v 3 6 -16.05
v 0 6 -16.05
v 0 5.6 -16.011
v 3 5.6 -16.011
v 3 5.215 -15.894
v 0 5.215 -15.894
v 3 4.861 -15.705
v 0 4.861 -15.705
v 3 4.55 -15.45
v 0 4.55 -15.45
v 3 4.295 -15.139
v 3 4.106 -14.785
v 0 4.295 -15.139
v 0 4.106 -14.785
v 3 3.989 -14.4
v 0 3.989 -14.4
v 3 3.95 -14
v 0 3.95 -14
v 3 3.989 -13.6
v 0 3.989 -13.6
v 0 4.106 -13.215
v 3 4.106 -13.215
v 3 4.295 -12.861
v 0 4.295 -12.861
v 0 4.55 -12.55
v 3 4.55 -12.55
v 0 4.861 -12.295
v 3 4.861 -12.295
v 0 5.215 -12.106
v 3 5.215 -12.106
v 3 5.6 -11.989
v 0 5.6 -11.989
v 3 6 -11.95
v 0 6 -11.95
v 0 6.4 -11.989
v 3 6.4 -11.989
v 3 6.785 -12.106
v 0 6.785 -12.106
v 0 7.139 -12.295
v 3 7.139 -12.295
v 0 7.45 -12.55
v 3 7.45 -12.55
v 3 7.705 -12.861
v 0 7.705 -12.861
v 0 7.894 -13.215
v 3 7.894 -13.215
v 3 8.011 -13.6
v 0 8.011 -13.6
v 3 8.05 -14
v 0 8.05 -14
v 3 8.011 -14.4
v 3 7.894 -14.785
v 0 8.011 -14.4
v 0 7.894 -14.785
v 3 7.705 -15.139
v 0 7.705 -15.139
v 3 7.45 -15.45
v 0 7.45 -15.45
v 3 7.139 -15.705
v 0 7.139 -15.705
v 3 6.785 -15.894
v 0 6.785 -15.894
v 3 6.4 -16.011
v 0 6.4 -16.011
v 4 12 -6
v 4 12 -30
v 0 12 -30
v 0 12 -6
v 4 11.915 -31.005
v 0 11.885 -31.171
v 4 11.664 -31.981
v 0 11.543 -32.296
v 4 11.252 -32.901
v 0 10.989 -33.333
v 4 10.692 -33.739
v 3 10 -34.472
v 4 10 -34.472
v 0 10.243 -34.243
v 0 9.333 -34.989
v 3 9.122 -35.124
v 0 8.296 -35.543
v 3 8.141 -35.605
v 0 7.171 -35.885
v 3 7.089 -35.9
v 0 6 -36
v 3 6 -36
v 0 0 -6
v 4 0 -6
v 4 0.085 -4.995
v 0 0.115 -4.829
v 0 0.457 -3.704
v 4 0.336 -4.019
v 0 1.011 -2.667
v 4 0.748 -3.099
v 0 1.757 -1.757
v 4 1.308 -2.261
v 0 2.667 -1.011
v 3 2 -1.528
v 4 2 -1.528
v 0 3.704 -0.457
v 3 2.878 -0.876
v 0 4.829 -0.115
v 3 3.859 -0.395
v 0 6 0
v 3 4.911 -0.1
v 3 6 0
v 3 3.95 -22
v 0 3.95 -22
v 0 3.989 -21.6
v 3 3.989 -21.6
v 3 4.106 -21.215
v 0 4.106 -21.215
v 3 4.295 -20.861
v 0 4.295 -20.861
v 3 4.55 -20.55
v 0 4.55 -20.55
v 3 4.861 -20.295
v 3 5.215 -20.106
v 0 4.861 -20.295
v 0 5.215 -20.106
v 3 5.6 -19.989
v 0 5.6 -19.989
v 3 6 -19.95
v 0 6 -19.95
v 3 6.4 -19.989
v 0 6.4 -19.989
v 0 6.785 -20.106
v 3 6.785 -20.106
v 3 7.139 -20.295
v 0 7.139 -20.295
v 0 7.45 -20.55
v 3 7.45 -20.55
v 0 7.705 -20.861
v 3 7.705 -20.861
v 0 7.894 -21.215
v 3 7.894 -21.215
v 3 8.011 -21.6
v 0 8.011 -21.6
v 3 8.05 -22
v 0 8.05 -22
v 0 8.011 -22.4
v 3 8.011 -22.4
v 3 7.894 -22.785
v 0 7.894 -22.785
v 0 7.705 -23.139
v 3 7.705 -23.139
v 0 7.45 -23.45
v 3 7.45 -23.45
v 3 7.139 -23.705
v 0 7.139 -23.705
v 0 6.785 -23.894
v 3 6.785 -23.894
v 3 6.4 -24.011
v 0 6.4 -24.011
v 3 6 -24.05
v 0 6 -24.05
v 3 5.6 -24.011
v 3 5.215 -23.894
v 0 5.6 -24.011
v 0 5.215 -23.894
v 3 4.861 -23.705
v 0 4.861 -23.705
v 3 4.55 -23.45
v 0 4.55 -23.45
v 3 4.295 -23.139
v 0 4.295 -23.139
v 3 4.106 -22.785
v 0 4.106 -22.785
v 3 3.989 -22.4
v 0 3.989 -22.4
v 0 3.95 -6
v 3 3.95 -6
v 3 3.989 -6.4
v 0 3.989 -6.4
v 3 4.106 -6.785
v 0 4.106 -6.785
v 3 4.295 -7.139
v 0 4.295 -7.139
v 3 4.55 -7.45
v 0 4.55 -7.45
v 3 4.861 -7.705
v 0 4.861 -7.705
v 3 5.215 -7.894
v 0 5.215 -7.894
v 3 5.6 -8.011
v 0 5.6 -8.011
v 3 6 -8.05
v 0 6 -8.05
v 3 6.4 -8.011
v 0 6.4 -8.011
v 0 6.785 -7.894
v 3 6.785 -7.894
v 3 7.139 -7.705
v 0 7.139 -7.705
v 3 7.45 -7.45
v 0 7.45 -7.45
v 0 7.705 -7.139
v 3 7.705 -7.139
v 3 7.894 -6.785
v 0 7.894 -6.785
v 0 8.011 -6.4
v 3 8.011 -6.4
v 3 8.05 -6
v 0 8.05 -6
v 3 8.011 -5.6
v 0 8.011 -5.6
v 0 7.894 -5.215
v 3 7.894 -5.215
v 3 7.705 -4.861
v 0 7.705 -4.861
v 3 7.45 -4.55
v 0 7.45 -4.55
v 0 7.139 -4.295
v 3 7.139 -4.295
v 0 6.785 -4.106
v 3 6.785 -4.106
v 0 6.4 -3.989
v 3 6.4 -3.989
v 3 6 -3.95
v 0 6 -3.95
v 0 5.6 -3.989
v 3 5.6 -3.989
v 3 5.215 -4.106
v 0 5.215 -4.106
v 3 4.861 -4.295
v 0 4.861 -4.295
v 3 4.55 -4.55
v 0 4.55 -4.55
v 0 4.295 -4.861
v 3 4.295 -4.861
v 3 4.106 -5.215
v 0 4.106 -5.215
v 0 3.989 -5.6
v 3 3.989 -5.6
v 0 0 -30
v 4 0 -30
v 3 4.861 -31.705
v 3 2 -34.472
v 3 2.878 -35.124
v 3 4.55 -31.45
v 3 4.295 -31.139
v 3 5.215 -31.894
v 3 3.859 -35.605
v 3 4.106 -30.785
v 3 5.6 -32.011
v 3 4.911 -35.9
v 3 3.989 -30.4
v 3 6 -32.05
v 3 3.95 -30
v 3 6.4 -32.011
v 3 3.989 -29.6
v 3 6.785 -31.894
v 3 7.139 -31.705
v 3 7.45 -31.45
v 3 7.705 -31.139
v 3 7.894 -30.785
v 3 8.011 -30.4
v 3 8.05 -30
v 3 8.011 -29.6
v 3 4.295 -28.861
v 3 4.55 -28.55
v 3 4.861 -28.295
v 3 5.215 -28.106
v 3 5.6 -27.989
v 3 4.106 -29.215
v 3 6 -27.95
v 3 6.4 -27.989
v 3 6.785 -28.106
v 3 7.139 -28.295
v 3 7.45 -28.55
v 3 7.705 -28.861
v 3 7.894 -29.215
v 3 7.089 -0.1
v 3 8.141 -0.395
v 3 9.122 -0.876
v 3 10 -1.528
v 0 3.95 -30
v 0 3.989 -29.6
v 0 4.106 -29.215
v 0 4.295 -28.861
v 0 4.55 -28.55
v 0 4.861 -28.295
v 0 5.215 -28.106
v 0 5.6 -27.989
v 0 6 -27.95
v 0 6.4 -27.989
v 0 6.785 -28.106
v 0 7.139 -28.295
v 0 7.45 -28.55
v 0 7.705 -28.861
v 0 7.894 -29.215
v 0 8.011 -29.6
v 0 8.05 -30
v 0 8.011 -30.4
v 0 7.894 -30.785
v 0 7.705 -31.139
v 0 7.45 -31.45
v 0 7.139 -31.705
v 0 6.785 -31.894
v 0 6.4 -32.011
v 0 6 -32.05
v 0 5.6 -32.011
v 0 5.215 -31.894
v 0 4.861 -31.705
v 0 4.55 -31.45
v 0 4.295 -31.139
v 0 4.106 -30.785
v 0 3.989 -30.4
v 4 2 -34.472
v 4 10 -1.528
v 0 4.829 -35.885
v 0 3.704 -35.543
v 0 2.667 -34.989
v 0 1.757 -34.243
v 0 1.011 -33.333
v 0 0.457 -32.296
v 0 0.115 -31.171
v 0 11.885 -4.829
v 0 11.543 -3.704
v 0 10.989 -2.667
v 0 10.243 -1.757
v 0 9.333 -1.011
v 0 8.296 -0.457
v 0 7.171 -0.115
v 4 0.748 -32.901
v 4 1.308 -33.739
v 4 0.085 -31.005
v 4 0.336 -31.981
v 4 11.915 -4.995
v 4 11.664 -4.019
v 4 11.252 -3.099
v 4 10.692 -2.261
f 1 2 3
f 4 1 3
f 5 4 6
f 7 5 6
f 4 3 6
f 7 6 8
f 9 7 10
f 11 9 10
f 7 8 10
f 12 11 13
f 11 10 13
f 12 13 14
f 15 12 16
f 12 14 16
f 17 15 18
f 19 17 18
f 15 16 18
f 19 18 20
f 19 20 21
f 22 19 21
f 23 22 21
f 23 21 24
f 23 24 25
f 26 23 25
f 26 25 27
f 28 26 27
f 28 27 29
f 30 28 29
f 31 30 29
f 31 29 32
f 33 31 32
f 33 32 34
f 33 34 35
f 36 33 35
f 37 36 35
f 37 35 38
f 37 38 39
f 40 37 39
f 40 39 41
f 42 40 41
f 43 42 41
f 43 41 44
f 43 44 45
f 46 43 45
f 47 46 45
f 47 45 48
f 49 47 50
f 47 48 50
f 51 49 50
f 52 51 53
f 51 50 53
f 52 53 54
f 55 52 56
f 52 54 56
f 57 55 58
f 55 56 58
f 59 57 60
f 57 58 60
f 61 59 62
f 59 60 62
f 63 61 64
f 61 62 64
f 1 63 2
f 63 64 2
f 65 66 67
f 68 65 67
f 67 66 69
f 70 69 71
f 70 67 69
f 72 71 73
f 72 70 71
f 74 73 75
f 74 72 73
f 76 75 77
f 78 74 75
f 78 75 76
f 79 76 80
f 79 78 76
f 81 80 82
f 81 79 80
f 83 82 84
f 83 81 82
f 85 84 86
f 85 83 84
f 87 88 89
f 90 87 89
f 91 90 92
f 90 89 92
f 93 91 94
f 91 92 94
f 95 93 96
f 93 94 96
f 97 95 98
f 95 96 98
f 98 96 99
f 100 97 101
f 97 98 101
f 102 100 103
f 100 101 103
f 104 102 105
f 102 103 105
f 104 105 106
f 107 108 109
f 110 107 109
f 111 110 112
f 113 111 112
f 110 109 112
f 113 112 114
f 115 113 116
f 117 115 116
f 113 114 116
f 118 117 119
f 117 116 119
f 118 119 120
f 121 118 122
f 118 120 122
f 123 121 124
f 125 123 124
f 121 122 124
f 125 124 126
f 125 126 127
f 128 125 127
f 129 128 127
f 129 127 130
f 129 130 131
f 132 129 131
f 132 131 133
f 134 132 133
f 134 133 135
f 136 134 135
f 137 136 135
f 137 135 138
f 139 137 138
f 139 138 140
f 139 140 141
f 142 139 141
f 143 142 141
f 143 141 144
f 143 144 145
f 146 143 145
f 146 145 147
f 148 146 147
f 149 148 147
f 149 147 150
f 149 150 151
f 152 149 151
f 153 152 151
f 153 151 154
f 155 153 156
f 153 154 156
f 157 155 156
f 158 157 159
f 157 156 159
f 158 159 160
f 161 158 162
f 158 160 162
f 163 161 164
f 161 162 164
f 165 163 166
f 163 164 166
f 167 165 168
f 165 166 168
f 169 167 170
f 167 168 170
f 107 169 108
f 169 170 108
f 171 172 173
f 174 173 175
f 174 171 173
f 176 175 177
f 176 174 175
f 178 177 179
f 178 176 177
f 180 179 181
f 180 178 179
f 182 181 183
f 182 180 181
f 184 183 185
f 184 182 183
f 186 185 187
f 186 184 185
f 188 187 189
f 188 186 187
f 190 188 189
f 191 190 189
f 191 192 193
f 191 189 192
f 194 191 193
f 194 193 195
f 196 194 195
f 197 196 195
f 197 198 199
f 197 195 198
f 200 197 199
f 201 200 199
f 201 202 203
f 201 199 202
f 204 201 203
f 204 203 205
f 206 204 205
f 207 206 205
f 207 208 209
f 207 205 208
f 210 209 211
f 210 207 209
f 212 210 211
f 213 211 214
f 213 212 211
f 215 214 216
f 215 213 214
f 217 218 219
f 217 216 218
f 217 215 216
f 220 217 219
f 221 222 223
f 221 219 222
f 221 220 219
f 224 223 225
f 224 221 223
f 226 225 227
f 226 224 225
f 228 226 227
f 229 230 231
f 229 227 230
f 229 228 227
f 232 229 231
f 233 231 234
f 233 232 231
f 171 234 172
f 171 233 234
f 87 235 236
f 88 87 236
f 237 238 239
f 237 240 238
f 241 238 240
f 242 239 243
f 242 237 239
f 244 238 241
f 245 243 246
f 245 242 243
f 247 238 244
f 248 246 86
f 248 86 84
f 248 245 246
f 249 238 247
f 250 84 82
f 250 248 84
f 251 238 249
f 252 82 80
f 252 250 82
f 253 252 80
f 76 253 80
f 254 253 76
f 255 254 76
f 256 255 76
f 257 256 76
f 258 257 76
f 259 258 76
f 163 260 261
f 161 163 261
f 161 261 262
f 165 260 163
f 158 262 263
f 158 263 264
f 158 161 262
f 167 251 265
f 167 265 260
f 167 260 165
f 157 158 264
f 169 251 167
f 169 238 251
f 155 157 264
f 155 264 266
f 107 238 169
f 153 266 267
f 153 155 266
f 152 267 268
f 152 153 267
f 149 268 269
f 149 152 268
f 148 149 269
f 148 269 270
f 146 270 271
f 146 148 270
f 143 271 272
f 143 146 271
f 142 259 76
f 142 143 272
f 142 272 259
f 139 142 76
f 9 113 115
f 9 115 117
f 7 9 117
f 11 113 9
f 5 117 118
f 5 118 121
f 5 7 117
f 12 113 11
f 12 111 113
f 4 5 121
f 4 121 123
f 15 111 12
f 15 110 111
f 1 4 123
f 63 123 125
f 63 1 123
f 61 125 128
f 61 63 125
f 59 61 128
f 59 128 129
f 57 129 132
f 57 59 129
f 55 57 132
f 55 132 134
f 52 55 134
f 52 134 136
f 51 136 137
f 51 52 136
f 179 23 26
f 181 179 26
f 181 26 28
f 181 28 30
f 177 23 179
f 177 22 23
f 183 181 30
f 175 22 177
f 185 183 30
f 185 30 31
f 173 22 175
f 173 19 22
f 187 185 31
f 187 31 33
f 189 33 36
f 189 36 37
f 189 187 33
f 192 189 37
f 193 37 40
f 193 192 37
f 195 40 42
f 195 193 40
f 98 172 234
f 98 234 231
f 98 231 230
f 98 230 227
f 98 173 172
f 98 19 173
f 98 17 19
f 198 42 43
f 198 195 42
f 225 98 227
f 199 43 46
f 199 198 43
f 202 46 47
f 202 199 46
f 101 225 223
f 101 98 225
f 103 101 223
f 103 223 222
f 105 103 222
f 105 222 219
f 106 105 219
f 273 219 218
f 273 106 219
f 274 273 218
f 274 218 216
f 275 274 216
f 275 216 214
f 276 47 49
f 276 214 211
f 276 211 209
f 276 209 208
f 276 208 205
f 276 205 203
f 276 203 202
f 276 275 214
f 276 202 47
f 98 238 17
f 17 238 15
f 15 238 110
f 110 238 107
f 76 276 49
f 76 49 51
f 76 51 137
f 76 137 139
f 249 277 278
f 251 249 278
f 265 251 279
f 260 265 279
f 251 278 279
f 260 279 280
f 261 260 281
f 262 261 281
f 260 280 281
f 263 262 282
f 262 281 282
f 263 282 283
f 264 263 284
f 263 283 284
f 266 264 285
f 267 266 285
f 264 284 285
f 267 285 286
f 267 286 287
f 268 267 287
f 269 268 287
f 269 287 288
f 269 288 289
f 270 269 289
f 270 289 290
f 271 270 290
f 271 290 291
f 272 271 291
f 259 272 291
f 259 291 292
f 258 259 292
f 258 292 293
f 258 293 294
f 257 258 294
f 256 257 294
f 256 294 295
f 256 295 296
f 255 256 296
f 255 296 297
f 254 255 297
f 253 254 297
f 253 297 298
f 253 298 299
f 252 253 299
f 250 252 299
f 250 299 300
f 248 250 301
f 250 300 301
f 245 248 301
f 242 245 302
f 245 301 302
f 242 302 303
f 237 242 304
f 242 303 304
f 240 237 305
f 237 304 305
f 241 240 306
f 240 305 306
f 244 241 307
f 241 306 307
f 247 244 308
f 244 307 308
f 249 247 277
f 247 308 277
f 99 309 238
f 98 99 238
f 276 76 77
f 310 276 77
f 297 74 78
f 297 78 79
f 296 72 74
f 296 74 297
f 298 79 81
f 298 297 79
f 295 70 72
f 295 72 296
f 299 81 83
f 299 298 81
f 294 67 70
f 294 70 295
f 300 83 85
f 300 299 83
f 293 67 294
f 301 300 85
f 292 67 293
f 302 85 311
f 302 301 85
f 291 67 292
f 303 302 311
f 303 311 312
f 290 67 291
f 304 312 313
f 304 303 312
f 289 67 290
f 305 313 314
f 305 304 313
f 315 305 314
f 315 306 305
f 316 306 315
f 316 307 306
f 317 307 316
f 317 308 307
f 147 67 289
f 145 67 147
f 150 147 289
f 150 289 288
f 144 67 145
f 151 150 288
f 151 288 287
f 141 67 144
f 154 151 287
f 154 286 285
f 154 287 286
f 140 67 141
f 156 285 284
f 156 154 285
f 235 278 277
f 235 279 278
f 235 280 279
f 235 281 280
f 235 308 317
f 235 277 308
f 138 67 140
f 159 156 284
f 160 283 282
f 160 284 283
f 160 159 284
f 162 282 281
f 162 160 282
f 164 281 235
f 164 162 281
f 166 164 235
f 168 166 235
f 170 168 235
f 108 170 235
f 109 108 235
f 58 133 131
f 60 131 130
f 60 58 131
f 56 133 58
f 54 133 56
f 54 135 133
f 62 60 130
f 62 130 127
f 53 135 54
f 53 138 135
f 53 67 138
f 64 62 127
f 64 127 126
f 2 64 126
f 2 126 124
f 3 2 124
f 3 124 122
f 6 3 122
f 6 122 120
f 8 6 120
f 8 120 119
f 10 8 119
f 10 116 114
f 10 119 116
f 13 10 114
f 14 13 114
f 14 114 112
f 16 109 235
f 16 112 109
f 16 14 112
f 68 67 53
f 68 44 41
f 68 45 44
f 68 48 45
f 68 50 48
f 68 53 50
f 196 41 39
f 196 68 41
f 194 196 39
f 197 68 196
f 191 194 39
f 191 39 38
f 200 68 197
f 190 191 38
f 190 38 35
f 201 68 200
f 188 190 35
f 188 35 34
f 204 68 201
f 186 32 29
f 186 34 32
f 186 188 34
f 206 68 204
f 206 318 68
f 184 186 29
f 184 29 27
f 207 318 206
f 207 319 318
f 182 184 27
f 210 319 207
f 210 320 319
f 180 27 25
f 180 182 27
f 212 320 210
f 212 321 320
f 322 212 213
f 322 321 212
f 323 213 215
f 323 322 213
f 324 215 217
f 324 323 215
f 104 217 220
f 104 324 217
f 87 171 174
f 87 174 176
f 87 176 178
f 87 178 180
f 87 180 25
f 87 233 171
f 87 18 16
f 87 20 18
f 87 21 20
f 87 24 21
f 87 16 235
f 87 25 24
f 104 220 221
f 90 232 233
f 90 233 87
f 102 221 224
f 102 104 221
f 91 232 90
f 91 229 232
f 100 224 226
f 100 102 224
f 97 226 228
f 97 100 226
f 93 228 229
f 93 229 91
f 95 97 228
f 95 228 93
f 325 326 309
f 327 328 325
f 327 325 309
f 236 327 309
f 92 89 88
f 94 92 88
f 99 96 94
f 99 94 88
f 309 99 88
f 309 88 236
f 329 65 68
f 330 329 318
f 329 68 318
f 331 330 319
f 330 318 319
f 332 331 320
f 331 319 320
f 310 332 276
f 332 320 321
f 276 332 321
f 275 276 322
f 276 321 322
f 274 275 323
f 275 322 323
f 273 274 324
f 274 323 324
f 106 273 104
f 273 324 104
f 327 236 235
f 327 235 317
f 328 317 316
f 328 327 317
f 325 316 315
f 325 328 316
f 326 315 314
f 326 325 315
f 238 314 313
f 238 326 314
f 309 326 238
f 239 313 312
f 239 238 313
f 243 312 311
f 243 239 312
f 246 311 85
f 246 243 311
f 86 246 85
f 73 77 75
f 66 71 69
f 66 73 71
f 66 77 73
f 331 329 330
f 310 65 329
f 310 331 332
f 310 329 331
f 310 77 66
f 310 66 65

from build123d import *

# Parameters (mm, degrees)
BOSS_EXTRUDE1_DEPTH     = 36
FILLET1_R               = 6
SKETCH2_R               = 2.05
CUT_EXTRUDE1_DEPTH      = 39.157568057
LPATTERN1_COUNT         = 2
LPATTERN1_PITCH         = 8
MIRROR1_COPY_1_SKETCH_R = 2.05
MIRROR1_COPY_1_DEPTH    = 39.157568057


with BuildPart() as part:
    # Sketch1 → Boss-Extrude1 (new body)
    with BuildSketch(Plane.XY):
        Polygon((0, 0), (4, 0), (4, 2), (3, 2), (3, 10), (4, 10), (4, 12), (0, 12), align=None)
    extrude(amount=-BOSS_EXTRUDE1_DEPTH)

    # Fillet1
    fillet1_edges = [part.edges().sort_by_distance(p)[0] for p in [
        (2, 12, 0),
        (2, 0, 0),
        (2, 0, -36),
        (2, 12, -36),
    ]]
    fillet(fillet1_edges, radius=FILLET1_R - 0.0001)  # a hair under: the kernel refuses the full size

    # Sketch2 → Cut-Extrude1 (cut, through all)
    with BuildSketch(Plane.ZY):
        with Locations(Location((-30, 6, 0), (0, 0, 270))):
            Circle(SKETCH2_R)
    cut_extrude1 = extrude(amount=-CUT_EXTRUDE1_DEPTH, mode=Mode.SUBTRACT)

    # LPattern1: Cut-Extrude1 ×2
    with Locations(*[(0, 0, i * LPATTERN1_PITCH) for i in range(1, LPATTERN1_COUNT)]):
        add(cut_extrude1, mode=Mode.SUBTRACT)

    # Mirror1: Cut-Extrude1 across plane
    add(cut_extrude1.mirror(Plane.XY.offset(-18)), mode=Mode.SUBTRACT)

    # Mirror1 copy 1 sketch → Mirror1 copy 1 (cut, through all)
    with BuildSketch(Plane(origin=(0, 0, -44), x_dir=(0, 0, -1), z_dir=(-1, 0, 0))):
        with Locations((-30, -6)):
            Circle(MIRROR1_COPY_1_SKETCH_R)
    extrude(amount=-MIRROR1_COPY_1_DEPTH, mode=Mode.SUBTRACT)


solid = part.part
